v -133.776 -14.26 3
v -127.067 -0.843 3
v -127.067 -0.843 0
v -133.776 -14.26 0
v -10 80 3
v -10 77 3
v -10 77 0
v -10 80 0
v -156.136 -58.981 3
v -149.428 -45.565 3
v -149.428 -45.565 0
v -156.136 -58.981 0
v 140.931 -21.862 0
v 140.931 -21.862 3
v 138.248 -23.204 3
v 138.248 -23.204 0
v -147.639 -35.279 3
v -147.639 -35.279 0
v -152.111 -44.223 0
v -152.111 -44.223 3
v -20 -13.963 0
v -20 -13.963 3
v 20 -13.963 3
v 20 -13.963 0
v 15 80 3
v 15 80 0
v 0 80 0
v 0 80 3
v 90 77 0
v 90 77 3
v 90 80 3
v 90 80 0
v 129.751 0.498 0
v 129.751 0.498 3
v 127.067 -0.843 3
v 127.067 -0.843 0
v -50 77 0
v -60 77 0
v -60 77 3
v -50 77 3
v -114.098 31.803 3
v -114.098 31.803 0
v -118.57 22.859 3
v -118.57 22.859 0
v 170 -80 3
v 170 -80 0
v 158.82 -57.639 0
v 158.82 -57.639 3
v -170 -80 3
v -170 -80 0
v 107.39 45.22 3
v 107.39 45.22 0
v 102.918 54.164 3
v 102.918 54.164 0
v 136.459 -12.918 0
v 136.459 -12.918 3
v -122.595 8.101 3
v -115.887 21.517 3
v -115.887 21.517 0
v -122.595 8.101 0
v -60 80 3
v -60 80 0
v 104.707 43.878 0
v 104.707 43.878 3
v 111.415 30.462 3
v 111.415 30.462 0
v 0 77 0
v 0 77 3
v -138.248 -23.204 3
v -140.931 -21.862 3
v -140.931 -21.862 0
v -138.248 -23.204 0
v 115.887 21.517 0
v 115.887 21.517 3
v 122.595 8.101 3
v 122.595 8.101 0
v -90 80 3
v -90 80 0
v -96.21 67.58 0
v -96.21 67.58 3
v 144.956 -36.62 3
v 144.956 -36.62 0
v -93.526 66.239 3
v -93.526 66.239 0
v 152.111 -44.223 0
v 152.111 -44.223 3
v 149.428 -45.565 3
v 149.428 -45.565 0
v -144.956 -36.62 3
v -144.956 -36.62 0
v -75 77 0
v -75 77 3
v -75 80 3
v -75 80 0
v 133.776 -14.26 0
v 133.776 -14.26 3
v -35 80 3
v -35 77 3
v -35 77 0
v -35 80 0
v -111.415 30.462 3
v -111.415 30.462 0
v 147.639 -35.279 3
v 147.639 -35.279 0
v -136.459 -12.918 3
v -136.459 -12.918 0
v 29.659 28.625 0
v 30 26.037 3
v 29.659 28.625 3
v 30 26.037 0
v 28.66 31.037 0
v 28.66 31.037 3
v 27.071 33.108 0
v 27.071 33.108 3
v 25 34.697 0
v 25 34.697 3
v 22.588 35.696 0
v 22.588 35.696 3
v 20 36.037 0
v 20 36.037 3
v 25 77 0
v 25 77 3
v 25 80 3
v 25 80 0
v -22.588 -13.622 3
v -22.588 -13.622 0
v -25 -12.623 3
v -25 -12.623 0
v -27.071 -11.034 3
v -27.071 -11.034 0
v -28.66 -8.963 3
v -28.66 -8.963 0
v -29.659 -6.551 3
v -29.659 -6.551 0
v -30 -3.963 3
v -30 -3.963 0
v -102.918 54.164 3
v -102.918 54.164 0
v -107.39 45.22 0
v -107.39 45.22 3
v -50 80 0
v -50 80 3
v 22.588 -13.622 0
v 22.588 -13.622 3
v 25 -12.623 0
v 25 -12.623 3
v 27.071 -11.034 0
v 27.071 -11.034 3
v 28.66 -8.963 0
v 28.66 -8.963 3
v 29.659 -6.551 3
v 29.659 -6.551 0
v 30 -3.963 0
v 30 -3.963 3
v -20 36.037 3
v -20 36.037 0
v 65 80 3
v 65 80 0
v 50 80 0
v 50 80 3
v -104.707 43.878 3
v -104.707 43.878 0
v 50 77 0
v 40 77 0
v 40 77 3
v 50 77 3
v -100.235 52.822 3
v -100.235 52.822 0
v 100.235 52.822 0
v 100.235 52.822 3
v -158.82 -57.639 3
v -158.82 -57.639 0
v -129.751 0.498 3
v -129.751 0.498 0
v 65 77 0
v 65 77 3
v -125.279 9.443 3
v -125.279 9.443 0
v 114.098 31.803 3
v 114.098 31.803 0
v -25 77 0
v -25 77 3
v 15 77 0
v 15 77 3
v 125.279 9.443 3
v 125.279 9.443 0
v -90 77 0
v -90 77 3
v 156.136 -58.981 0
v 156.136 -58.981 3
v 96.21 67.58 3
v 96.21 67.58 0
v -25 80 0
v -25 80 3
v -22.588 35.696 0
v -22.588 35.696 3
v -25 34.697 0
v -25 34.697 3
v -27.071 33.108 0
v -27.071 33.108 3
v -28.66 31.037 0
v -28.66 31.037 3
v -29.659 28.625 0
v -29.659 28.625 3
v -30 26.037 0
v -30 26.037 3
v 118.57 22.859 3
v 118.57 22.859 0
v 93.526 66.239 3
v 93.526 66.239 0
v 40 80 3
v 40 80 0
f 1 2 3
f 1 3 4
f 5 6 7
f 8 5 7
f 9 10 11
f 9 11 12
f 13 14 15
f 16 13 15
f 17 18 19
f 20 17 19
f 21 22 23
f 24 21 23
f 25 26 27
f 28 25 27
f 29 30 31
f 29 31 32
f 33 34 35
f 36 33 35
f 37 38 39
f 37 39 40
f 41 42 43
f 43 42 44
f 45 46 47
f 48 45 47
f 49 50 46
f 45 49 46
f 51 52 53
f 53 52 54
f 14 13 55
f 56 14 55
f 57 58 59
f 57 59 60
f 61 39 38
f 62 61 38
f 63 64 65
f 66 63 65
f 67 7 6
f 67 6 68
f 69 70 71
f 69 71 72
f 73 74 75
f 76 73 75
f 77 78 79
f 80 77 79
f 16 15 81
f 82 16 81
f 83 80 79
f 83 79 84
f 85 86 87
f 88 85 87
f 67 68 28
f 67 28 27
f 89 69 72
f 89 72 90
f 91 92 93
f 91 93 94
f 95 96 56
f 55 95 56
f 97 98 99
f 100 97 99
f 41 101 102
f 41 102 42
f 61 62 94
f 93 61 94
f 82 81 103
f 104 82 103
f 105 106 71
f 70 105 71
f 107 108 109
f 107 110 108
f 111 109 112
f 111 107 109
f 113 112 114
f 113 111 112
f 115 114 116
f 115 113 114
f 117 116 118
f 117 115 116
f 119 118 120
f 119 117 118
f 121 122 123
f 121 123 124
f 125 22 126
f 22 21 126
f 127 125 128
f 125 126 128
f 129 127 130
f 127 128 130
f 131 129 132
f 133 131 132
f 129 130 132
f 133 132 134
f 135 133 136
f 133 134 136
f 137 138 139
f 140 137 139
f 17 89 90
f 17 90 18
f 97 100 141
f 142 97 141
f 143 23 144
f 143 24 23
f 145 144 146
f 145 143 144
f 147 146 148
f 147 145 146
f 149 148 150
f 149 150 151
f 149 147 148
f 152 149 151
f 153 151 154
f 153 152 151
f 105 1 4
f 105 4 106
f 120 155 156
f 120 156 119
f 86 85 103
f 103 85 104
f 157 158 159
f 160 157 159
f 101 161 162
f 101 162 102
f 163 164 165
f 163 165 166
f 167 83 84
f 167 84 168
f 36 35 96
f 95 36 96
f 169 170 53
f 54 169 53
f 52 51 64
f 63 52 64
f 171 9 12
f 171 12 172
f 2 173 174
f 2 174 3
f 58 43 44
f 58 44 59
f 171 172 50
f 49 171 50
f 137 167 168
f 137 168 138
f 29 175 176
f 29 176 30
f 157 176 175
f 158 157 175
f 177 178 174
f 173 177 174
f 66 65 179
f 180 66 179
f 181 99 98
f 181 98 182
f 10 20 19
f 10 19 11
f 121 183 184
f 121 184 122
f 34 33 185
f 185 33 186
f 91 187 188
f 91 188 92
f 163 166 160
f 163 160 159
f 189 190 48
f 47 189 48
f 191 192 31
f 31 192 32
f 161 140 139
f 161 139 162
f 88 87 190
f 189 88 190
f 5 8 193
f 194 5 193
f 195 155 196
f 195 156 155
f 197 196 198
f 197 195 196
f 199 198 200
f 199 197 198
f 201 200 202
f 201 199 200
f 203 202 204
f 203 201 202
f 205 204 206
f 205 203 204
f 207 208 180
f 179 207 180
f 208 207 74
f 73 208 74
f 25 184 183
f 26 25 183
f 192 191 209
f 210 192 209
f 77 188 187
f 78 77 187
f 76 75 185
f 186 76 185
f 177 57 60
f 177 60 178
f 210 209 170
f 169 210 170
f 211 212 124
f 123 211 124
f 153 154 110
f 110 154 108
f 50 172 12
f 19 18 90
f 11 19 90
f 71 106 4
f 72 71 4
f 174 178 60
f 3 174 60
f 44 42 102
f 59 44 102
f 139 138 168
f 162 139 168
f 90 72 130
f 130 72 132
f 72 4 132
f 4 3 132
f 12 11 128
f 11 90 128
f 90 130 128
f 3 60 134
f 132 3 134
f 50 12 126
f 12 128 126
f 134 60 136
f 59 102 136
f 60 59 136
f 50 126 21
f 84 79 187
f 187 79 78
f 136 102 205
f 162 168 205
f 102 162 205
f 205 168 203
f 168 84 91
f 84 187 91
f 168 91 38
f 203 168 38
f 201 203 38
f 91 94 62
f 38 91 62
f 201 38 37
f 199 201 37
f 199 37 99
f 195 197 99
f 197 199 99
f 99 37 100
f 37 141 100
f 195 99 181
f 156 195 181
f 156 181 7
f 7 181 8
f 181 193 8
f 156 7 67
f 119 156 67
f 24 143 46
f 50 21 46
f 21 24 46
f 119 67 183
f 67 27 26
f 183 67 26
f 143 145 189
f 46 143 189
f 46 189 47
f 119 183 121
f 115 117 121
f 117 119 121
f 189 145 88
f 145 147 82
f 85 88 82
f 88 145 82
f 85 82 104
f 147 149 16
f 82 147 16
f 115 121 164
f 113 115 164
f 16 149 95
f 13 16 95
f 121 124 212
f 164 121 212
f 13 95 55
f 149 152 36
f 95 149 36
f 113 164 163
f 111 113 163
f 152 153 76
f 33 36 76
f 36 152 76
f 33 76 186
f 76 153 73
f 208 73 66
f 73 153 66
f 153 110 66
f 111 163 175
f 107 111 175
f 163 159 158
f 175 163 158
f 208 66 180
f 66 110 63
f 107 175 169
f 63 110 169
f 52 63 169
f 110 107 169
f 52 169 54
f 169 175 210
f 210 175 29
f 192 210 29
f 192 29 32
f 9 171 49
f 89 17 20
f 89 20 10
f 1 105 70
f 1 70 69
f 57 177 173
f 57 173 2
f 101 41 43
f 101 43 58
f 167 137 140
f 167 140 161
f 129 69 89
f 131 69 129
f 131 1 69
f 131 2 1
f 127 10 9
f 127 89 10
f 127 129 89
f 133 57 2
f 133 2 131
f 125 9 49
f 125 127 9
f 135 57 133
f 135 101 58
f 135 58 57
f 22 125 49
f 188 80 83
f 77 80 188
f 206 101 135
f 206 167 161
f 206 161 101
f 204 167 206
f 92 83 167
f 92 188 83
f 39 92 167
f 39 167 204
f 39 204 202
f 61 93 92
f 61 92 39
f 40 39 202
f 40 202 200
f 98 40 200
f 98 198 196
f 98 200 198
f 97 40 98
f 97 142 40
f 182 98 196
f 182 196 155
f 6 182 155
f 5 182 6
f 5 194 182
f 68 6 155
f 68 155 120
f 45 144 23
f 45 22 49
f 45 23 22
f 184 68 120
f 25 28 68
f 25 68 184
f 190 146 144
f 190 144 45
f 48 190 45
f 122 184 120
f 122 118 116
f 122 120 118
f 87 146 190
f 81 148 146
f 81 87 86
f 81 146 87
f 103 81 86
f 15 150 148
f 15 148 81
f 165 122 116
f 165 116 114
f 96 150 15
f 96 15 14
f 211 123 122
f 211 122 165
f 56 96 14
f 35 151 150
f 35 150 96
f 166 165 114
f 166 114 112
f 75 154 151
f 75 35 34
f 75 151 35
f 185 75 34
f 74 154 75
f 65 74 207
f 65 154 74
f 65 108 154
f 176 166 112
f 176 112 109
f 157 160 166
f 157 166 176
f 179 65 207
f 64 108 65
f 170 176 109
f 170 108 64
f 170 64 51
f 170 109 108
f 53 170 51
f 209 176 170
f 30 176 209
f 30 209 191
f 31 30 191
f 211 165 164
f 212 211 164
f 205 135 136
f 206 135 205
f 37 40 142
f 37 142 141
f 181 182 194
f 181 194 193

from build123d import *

# Parameters (mm, degrees)
BOSS_EXTRUDE1_DEPTH = 3
CUT_EXTRUDE1_DEPTH  = 10
LPATTERN1_COUNT     = 6
LPATTERN1_PITCH     = 25
CUT_EXTRUDE2_DEPTH  = 10
LPATTERN2_COUNT     = 6
LPATTERN2_PITCH     = 25
CAVITY1_START       = 77
CAVITY1_OUTLINE_W   = 15
CAVITY1_OUTLINE_H   = 3
CAVITY1_OUTLINE_W_2 = 10
CAVITY1_OUTLINE_W_3 = 25
CAVITY1_DEPTH       = 3
SKETCH5_W           = 60
SKETCH5_H           = 50
CUT_EXTRUDE3_DEPTH  = 10
FILLET1_R           = 10


# Read off the part's stored shape, not the designer's step: Cavity1
with BuildPart() as part:
    # Sketch1 → Boss-Extrude1 (new body)
    with BuildSketch(Plane.XY):
        Polygon((-170, -80), (170, -80), (90, 80), (-90, 80), align=None)
    extrude(amount=BOSS_EXTRUDE1_DEPTH)

    # Sketch2 → Cut-Extrude1 (cut)
    with BuildSketch(Plane.XY.offset(3)):
        Polygon((-158.819660113, -57.639320225), (-152.11145618, -44.22291236), (-149.428174607, -45.564553147), (-156.13637854, -58.980961012), align=None)
    cut_extrude1 = extrude(amount=-CUT_EXTRUDE1_DEPTH, mode=Mode.SUBTRACT)

    # LPattern1: Cut-Extrude1 ×6
    with Locations(*[Vector(0.44721359549995776, 0.894427190999916, 0) * (i * LPATTERN1_PITCH) for i in range(1, LPATTERN1_COUNT)]):
        add(cut_extrude1, mode=Mode.SUBTRACT)

    # Sketch3 → Cut-Extrude2 (cut)
    with BuildSketch(Plane.XY.offset(3)):
        Polygon((158.819660113, -57.639320225), (152.11145618, -44.22291236), (149.428174607, -45.564553147), (156.13637854, -58.980961012), align=None)
    cut_extrude2 = extrude(amount=-CUT_EXTRUDE2_DEPTH, mode=Mode.SUBTRACT)

    # LPattern2: Cut-Extrude2 ×6
    with Locations(*[Vector(-0.4472135954999582, 0.8944271909999159, 0) * (i * LPATTERN2_PITCH) for i in range(1, LPATTERN2_COUNT)]):
        add(cut_extrude2, mode=Mode.SUBTRACT)

    # Cavity1 outline → Cavity1 (cut)
    with BuildSketch(Plane(origin=(0, 0, 0), x_dir=(1, 0, 0), z_dir=(0, 1, 0)).offset(CAVITY1_START)):
        with Locations((-82.5, -1.5)):
            Rectangle(CAVITY1_OUTLINE_W, CAVITY1_OUTLINE_H)
        with Locations((-55, -1.5)):
            Rectangle(CAVITY1_OUTLINE_W_2, CAVITY1_OUTLINE_H)
        with Locations((-30, -1.5)):
            Rectangle(CAVITY1_OUTLINE_W_2, CAVITY1_OUTLINE_H)
        with Locations((-5, -1.5)):
            Rectangle(CAVITY1_OUTLINE_W_2, CAVITY1_OUTLINE_H)
        with Locations((20, -1.5)):
            Rectangle(CAVITY1_OUTLINE_W_2, CAVITY1_OUTLINE_H)
        with Locations((45, -1.5)):
            Rectangle(CAVITY1_OUTLINE_W_2, CAVITY1_OUTLINE_H)
        with Locations((77.5, -1.5)):
            Rectangle(CAVITY1_OUTLINE_W_3, CAVITY1_OUTLINE_H)
    extrude(amount=CAVITY1_DEPTH, mode=Mode.SUBTRACT)

    # Sketch5 → Cut-Extrude3 (cut)
    with BuildSketch(Plane.XY.offset(3)):
        with Locations((0, 11.03685601)):
            Rectangle(SKETCH5_W, SKETCH5_H)
    extrude(amount=-CUT_EXTRUDE3_DEPTH, mode=Mode.SUBTRACT)

    # Fillet1
    fillet1_edges = [part.edges().sort_by_distance(p)[0] for p in [
        (30, 36.03685601, 1.5),
        (30, -13.96314399, 1.5),
        (-30, -13.96314399, 1.5),
        (-30, 36.03685601, 1.5),
    ]]
    fillet(fillet1_edges, radius=FILLET1_R)


solid = part.part
